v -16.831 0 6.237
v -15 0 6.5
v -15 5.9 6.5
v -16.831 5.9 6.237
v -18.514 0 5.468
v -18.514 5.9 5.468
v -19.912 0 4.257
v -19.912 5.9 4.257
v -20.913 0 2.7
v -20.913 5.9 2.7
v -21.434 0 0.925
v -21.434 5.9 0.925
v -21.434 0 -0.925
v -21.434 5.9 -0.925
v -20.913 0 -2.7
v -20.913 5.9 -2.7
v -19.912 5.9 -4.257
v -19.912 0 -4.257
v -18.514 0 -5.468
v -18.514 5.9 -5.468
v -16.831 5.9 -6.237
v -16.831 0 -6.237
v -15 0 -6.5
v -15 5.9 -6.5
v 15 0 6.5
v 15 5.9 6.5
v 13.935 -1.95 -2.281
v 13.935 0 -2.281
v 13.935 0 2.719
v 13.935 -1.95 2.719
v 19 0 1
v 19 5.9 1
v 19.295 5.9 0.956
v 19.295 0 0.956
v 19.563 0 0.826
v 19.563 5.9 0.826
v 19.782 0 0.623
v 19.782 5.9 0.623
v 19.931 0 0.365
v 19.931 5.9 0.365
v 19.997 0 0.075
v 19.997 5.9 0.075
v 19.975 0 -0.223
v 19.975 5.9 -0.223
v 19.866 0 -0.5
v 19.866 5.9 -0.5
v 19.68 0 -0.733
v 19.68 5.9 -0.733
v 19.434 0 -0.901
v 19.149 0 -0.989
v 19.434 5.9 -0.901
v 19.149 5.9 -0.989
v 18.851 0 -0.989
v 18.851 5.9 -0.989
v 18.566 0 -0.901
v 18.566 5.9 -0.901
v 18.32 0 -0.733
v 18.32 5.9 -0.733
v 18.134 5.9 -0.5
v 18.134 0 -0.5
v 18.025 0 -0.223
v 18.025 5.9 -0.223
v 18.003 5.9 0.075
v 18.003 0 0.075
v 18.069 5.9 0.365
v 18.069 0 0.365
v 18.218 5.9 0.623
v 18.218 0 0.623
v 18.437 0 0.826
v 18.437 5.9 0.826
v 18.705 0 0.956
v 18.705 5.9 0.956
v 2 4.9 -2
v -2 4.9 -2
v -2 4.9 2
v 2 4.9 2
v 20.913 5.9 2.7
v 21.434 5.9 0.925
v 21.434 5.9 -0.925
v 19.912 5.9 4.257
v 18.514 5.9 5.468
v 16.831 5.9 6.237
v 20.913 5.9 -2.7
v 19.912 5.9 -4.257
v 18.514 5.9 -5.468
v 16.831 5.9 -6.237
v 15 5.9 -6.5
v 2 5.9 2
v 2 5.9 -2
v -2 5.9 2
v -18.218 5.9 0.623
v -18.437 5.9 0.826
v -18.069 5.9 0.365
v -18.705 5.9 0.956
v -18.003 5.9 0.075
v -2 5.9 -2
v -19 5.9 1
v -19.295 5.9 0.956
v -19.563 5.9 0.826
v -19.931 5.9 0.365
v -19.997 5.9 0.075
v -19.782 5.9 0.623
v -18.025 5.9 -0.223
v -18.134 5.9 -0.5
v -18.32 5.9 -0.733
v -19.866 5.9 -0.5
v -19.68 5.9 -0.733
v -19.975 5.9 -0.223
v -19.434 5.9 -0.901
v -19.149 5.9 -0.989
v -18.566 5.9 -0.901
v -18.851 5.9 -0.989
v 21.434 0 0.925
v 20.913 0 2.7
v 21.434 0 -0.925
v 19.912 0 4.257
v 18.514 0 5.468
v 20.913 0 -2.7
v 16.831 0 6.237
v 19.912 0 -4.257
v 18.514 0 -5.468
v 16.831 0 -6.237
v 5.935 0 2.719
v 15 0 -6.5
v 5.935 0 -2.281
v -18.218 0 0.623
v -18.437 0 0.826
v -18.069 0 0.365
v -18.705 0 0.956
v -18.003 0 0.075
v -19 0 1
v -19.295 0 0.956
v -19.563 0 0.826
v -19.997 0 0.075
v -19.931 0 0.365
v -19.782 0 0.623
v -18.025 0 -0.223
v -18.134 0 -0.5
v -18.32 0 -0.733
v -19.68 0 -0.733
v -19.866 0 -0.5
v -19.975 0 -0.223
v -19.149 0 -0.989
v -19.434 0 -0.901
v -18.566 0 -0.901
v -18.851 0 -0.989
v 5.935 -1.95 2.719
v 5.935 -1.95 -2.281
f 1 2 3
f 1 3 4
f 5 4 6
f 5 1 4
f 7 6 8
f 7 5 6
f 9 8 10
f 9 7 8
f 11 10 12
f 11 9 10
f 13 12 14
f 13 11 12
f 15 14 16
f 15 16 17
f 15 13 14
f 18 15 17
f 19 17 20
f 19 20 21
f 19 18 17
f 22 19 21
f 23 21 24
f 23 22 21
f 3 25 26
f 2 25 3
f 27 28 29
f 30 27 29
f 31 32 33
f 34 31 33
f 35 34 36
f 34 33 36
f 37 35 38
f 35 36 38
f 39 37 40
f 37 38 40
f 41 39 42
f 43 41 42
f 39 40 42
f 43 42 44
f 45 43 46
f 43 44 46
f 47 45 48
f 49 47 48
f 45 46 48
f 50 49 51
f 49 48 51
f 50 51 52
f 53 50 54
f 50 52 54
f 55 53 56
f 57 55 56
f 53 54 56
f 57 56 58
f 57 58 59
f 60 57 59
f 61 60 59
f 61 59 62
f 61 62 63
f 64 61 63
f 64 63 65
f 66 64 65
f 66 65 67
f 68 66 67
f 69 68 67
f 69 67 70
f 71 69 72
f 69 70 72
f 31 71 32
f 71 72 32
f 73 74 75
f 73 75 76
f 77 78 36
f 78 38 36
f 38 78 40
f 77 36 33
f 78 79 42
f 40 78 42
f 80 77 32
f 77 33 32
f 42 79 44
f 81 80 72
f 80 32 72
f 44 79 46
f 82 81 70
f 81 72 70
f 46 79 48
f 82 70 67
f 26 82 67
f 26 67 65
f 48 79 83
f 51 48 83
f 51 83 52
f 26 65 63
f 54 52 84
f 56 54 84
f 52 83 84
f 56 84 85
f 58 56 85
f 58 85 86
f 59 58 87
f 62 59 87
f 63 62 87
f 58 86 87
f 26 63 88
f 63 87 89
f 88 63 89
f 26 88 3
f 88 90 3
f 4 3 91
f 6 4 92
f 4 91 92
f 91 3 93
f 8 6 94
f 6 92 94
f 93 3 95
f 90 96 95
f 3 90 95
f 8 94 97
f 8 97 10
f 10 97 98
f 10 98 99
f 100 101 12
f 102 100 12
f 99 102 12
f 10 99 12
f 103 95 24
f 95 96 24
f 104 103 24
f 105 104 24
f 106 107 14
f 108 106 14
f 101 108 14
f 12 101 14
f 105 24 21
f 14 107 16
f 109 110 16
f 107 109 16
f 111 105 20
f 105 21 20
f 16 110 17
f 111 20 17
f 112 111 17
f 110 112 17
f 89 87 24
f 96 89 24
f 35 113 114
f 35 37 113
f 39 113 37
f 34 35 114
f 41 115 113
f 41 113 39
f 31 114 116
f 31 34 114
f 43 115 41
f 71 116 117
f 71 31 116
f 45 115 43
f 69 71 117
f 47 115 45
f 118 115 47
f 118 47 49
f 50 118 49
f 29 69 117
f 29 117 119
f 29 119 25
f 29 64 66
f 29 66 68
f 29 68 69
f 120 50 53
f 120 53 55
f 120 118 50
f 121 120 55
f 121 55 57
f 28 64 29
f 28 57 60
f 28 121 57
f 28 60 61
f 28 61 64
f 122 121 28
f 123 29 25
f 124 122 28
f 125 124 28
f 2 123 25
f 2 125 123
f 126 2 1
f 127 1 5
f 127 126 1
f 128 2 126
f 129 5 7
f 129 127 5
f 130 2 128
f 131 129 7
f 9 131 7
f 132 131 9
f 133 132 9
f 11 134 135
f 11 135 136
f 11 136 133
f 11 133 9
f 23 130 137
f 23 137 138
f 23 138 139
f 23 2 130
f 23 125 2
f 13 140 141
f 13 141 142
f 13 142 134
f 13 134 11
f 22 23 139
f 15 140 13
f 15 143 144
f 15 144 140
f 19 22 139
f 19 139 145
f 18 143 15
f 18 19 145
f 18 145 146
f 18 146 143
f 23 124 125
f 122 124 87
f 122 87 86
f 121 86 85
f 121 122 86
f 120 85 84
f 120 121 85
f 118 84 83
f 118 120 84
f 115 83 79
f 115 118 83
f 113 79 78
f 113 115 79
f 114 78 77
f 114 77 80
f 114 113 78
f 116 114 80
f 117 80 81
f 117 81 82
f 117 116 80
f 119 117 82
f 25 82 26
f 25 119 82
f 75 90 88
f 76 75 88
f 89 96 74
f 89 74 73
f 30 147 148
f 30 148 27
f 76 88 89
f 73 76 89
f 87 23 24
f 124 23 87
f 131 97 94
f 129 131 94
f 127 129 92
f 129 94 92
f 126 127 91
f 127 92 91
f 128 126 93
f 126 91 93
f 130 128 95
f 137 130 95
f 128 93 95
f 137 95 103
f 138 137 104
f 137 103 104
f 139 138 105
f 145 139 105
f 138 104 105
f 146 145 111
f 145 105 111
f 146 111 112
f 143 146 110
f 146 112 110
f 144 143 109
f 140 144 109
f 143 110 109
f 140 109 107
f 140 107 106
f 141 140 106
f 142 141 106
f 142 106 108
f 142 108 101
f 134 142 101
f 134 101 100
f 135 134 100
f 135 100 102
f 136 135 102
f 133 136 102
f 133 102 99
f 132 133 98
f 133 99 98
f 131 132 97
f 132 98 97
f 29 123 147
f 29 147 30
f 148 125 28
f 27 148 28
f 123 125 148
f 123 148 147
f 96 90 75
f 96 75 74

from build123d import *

# Parameters (mm, degrees)
BOSS_EXTRUDE1_DEPTH = 5.9
SKETCH2_R           = 1
CUT_EXTRUDE1_DEPTH  = 5.9
SKETCH3_W           = 4
SKETCH3_H           = 4
CUT_EXTRUDE2_DEPTH  = 1
SKETCH4_W           = 8
SKETCH4_H           = 5
BOSS_EXTRUDE2_DEPTH = 1.95


with BuildPart() as part:
    # Sketch1 → Boss-Extrude1 (new body)
    with BuildSketch(Plane(origin=(0, 0, 0), x_dir=(1, 0, 0), z_dir=(0, 1, 0))):
        with BuildLine():
            Line((-15, 6.5), (15, 6.5))
            ThreePointArc((15, 6.5), (21.5, 0), (15, -6.5))
            Line((15, -6.5), (-15, -6.5))
            ThreePointArc((-15, -6.5), (-21.5, 0), (-15, 6.5))
        make_face()
    extrude(amount=BOSS_EXTRUDE1_DEPTH)

    # Sketch2 → Cut-Extrude1 (cut)
    with BuildSketch(Plane(origin=(0, 5.9, 0), x_dir=(1, 0, 0), z_dir=(0, 1, 0))):
        with Locations(Location((-19, 0, 0), (0, 0, 270))):
            Circle(SKETCH2_R)
        with Locations(Location((19, 0, 0), (0, 0, 270))):
            Circle(SKETCH2_R)
    extrude(amount=-CUT_EXTRUDE1_DEPTH, mode=Mode.SUBTRACT)

    # Sketch3 → Cut-Extrude2 (cut)
    with BuildSketch(Plane(origin=(0, 5.9, 0), x_dir=(1, 0, 0), z_dir=(0, 1, 0))):
        Rectangle(SKETCH3_W, SKETCH3_H)
    extrude(amount=-CUT_EXTRUDE2_DEPTH, mode=Mode.SUBTRACT)

    # Sketch4 → Boss-Extrude2 (add)
    with BuildSketch(Plane.XZ):
        with Locations((9.93462309, 0.219446149)):
            Rectangle(SKETCH4_W, SKETCH4_H)
    extrude(amount=BOSS_EXTRUDE2_DEPTH)


solid = part.part
